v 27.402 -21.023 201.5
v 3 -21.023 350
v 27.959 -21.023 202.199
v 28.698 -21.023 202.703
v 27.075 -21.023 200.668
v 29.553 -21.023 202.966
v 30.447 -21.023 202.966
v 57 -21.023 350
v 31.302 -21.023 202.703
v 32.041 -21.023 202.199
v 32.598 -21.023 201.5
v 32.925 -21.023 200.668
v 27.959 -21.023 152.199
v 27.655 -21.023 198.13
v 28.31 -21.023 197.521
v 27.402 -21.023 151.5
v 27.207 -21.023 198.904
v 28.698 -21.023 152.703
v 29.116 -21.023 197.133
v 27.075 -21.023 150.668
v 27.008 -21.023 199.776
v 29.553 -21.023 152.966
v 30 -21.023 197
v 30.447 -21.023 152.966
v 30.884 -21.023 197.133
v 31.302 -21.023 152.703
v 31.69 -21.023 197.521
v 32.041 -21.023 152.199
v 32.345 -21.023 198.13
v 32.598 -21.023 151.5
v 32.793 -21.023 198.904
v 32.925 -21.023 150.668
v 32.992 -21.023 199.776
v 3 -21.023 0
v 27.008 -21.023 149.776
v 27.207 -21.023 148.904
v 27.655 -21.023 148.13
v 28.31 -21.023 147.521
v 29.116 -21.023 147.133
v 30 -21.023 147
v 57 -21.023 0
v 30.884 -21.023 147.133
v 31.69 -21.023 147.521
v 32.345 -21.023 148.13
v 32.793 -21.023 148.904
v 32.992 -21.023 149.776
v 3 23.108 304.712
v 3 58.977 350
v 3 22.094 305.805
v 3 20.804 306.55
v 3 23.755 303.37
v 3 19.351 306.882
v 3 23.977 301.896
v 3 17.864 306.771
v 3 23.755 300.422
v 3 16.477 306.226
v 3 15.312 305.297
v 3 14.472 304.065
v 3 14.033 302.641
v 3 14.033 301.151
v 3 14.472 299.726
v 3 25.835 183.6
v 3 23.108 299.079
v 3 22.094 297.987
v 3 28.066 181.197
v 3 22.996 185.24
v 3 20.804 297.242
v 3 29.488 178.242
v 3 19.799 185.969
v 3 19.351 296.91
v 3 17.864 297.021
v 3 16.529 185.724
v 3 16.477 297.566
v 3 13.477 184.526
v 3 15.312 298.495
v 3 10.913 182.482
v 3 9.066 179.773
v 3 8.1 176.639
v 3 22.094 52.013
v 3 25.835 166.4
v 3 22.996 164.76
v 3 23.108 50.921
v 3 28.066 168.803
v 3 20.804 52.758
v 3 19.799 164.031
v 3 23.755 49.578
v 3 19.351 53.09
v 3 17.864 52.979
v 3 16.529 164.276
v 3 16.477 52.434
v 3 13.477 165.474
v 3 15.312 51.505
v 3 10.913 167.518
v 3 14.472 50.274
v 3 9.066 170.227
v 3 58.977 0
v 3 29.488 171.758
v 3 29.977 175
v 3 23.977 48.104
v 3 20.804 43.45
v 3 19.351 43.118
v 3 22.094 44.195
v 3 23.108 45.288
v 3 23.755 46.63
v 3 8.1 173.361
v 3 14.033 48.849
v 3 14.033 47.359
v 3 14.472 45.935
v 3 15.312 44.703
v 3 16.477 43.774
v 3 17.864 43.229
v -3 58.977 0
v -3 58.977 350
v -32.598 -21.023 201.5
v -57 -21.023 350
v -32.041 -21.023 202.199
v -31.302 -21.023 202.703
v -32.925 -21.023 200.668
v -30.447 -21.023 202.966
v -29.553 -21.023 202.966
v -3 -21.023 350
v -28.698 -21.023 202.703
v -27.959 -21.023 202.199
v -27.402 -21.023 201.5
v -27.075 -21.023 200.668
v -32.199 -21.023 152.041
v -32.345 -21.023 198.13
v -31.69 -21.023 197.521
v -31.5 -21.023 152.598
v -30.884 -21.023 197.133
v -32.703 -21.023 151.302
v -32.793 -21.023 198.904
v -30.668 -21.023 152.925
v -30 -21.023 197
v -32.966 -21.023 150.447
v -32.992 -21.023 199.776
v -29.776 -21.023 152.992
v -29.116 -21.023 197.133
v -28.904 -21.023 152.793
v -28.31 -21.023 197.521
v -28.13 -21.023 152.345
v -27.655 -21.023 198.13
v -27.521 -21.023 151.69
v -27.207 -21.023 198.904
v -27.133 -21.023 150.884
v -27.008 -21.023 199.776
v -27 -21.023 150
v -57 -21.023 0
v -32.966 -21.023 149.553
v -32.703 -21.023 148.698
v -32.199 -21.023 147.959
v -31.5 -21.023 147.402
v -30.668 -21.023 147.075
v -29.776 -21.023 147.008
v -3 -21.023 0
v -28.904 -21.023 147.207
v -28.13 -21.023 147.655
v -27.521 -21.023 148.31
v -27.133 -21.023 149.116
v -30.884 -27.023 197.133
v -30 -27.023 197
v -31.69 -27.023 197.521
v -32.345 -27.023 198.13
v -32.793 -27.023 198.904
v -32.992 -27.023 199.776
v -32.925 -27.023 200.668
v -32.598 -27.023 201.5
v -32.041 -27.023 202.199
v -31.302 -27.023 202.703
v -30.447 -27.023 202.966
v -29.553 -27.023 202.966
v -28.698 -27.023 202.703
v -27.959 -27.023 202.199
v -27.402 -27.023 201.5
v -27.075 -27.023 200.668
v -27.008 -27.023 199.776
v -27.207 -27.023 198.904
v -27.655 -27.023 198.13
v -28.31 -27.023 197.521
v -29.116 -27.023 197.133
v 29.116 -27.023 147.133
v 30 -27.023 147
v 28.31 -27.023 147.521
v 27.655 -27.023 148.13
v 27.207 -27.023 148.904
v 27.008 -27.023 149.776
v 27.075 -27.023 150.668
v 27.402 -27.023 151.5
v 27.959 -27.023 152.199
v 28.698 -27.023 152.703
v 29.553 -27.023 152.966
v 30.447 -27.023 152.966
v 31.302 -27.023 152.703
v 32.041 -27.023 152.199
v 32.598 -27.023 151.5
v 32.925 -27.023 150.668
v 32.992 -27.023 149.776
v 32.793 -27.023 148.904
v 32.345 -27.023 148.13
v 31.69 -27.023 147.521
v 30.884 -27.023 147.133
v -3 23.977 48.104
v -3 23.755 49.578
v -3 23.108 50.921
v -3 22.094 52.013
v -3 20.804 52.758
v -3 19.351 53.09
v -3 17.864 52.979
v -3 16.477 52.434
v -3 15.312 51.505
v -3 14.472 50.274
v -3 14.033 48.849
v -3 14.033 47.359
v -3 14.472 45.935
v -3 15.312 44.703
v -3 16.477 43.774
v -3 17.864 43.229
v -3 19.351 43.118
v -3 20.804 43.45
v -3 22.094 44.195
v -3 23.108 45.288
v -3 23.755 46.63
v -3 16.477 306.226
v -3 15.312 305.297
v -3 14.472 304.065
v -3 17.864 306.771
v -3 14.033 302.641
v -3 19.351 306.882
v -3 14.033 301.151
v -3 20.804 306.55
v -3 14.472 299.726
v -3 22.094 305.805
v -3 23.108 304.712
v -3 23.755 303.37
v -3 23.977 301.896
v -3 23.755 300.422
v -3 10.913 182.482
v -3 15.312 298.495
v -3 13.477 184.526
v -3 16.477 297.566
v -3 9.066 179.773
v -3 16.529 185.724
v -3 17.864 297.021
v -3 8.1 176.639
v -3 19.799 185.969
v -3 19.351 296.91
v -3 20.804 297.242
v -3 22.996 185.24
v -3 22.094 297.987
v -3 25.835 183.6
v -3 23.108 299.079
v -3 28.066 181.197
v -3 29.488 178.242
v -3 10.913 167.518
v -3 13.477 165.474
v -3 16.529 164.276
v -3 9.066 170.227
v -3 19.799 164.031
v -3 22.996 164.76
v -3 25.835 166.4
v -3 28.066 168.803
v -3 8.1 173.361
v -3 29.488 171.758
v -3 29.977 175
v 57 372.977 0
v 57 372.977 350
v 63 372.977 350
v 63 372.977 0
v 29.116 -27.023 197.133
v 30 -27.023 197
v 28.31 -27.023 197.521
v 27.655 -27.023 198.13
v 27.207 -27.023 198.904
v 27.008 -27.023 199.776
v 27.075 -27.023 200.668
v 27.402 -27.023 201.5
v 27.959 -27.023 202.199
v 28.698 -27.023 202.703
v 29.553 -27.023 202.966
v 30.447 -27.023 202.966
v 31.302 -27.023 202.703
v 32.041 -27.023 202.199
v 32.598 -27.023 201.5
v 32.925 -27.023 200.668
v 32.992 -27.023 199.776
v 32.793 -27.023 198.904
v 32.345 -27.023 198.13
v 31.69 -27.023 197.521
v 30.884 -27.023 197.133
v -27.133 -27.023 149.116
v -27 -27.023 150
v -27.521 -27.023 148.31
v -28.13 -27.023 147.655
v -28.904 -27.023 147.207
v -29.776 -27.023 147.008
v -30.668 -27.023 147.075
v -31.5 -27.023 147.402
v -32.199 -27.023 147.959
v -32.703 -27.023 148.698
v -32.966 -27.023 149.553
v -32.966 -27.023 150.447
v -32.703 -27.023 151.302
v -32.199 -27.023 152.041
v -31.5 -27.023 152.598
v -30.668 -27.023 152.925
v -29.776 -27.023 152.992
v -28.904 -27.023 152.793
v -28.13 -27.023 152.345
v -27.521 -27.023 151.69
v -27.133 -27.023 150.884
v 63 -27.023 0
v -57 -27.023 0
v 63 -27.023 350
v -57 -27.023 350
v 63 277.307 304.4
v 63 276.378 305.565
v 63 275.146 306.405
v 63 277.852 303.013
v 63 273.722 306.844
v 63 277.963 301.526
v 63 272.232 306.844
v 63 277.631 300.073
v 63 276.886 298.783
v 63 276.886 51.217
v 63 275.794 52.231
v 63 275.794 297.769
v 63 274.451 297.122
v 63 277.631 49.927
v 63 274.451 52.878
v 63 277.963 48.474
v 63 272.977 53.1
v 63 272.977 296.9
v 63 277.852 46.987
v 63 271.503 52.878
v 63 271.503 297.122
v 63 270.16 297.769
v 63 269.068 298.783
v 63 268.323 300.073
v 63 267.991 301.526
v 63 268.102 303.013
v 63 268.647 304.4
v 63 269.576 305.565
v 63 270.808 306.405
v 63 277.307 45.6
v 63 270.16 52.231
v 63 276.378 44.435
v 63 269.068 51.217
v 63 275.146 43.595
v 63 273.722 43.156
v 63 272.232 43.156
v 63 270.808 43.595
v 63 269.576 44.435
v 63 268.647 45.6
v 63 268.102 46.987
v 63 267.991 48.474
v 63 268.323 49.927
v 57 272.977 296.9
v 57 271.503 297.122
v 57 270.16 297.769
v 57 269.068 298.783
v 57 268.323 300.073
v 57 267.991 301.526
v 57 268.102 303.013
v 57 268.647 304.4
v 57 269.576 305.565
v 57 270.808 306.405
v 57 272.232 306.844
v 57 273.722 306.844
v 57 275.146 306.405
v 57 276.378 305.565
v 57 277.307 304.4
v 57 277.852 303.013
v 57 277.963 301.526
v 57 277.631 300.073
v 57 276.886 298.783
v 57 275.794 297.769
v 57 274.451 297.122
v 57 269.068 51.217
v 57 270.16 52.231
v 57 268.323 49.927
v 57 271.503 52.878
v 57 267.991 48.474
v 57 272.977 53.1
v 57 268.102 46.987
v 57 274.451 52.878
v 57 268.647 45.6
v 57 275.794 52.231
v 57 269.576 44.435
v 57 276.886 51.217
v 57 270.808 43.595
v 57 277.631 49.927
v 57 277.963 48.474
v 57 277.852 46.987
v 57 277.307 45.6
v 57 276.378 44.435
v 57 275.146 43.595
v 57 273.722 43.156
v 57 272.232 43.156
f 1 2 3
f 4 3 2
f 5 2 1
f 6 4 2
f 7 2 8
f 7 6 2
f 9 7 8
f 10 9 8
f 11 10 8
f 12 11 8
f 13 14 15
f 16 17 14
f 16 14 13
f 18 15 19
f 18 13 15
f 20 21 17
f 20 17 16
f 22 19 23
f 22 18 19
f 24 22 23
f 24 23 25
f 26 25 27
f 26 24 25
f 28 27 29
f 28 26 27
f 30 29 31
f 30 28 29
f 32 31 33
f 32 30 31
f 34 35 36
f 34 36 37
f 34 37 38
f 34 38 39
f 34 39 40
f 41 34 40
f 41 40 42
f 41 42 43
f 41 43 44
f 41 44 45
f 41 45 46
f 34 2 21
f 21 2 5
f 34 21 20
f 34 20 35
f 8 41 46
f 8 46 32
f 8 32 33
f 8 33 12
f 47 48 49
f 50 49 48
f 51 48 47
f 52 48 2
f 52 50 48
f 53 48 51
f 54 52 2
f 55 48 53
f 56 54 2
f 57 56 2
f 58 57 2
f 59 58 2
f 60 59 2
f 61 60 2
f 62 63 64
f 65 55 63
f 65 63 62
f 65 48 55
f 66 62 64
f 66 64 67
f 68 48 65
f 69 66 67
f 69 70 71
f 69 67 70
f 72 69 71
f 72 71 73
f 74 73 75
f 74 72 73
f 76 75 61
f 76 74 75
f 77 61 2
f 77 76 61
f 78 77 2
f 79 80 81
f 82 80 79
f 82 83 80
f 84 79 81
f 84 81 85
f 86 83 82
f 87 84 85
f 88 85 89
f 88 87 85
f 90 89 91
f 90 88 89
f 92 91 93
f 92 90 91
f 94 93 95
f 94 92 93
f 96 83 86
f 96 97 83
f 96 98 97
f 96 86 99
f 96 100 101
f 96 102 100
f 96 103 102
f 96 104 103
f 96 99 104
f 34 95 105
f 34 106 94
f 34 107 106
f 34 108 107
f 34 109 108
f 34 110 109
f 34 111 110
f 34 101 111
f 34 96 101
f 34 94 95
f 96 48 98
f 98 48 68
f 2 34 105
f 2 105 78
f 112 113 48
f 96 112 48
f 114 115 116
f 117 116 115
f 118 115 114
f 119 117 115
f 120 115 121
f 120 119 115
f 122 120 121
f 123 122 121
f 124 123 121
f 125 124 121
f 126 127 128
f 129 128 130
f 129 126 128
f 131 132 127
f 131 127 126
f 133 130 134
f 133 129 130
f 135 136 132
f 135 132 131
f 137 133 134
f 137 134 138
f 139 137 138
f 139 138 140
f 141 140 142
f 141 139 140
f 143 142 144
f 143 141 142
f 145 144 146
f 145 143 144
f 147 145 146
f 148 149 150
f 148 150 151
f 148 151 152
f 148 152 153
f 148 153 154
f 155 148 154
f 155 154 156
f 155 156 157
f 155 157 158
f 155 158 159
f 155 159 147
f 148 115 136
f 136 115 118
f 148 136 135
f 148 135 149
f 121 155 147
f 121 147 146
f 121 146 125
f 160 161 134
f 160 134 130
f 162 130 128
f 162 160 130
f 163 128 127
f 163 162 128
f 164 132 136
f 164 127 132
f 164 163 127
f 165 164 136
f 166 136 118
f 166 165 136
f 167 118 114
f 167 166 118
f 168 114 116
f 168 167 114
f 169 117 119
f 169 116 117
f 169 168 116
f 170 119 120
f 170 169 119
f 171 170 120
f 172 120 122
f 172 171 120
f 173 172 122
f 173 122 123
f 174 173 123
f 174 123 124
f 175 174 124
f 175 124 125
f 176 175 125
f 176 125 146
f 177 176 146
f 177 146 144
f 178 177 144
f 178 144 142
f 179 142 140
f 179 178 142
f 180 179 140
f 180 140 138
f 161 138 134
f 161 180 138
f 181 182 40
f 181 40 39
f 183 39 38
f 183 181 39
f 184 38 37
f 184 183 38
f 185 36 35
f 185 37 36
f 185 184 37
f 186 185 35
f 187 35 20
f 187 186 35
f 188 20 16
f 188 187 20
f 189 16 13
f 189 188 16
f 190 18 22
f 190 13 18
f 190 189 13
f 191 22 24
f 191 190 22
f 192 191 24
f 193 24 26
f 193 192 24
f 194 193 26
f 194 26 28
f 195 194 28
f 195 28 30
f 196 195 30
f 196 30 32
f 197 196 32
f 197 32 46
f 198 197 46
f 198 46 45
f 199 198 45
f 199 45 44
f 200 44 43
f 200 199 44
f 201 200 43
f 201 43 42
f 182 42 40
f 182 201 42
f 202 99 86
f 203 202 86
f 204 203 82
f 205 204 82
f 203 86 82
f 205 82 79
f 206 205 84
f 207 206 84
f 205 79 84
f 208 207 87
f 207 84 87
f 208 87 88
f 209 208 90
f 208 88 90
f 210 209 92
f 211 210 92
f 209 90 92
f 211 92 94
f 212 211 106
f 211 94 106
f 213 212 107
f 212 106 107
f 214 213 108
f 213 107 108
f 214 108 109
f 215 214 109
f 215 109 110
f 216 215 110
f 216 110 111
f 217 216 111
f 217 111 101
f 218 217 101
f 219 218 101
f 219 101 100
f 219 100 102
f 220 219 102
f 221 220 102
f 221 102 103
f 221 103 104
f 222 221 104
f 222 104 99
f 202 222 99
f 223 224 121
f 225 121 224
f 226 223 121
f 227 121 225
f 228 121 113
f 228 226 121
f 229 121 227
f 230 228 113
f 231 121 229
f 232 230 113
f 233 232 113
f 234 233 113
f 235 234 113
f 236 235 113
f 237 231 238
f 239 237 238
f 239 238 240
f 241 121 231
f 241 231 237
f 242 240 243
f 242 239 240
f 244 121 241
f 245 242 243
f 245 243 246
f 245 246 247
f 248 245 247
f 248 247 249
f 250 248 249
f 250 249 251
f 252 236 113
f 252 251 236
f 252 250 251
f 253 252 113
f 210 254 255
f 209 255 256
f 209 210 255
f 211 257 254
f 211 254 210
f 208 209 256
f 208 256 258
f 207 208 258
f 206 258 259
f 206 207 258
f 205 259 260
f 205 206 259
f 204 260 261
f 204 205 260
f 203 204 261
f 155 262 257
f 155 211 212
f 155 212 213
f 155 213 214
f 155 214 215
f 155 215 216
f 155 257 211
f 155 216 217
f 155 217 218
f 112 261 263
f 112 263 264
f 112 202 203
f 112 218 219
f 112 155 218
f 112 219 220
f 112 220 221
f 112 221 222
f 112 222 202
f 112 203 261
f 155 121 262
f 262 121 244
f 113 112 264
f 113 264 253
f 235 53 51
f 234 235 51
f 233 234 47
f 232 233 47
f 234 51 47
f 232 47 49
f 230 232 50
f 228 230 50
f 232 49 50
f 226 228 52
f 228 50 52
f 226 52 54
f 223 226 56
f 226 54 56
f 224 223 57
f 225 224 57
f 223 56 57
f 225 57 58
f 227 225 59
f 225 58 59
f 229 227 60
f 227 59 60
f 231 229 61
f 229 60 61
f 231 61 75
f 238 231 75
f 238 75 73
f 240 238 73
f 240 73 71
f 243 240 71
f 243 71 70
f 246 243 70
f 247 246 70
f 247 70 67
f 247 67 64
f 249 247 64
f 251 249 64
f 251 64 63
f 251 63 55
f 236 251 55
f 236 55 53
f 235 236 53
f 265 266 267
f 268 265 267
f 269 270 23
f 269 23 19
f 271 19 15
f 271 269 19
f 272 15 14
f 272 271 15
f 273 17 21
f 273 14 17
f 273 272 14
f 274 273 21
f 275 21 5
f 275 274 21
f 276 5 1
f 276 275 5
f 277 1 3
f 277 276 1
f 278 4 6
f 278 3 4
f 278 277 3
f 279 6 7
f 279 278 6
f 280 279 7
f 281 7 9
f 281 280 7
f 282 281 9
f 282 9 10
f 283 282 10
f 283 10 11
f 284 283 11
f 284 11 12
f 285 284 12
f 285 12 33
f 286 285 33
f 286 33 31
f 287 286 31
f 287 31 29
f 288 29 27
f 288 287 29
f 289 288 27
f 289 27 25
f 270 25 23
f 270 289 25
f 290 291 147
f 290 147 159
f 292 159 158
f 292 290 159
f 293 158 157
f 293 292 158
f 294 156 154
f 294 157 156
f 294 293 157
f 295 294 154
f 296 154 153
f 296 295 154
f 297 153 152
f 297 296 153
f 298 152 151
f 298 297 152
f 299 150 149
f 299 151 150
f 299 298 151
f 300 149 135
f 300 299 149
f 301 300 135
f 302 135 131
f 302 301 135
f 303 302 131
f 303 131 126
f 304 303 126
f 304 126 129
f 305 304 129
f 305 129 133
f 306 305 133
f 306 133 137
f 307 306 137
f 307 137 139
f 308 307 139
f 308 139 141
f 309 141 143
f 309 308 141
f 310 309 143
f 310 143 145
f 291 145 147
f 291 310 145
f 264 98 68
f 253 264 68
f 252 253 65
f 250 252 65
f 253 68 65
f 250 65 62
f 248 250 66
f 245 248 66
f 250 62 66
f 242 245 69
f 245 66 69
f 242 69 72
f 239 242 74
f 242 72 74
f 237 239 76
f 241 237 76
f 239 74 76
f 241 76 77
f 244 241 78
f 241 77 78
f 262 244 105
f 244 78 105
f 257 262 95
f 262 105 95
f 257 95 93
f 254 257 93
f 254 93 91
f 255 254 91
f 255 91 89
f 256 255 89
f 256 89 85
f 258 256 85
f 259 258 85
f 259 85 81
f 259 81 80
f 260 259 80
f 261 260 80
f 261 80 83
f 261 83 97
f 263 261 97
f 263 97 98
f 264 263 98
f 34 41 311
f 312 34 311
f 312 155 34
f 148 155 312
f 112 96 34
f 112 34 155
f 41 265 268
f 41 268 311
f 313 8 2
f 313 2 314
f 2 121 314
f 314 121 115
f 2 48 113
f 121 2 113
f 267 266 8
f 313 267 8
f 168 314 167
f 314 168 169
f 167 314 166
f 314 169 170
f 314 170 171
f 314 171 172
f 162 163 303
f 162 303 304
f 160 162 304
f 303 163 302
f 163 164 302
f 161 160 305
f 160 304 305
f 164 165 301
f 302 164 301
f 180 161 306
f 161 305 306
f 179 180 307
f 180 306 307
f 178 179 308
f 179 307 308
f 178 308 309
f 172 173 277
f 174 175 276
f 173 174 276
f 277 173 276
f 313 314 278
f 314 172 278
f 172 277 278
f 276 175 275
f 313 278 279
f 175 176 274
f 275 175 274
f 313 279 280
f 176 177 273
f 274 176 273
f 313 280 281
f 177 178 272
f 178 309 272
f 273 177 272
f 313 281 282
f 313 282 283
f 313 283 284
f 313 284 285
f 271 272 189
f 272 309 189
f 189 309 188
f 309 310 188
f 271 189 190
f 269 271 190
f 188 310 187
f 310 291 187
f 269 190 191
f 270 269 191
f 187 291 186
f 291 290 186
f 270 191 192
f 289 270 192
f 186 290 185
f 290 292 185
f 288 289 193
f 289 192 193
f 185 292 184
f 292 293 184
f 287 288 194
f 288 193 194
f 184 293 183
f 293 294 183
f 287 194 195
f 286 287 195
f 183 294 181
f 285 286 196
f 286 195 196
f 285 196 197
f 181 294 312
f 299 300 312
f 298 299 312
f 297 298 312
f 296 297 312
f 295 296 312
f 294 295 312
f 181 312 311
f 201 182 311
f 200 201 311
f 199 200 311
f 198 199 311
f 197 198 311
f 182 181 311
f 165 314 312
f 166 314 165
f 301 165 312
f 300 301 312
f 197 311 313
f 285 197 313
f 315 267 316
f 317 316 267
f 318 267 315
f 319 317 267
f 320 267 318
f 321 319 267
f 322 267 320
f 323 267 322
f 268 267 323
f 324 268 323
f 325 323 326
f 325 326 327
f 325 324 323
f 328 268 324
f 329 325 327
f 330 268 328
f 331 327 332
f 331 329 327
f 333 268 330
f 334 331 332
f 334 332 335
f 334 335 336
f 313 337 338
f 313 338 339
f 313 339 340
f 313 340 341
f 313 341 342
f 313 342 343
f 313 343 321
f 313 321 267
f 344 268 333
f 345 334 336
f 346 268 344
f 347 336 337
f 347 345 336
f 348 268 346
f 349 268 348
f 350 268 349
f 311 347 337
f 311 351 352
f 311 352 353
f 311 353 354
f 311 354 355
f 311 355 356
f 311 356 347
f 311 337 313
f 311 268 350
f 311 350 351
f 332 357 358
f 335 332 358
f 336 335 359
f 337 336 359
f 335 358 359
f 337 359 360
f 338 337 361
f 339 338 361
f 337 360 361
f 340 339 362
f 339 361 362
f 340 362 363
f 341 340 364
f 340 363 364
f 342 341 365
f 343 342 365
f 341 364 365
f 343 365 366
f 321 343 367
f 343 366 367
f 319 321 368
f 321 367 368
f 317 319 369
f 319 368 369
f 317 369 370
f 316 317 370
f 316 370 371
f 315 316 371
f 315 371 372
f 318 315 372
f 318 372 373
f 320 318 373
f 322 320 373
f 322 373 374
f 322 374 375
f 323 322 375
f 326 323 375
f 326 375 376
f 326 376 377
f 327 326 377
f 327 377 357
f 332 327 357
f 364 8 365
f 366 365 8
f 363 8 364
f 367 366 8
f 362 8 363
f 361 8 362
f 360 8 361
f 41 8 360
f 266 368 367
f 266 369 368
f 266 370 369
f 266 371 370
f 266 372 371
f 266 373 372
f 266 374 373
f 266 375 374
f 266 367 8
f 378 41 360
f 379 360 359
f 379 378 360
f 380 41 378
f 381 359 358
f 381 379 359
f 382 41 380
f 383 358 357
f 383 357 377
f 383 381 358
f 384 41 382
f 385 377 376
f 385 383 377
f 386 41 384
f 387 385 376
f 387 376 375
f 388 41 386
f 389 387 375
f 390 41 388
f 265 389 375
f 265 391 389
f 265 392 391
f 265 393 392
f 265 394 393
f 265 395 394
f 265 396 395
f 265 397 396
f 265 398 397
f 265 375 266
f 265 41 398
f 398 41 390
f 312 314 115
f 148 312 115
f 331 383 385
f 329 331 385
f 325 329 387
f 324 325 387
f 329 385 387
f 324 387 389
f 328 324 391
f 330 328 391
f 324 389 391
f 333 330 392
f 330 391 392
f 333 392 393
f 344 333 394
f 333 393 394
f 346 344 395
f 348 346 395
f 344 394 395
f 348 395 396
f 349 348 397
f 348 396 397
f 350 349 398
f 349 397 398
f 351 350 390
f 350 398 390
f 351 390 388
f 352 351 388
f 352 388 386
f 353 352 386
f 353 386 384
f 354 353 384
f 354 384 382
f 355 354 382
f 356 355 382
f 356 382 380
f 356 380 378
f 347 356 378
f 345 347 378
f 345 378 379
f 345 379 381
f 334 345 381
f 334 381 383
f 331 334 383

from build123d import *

# Parameters (mm, degrees)
BOSS_EXTRUDE1_DEPTH     = 350
CUT_EXTRUDE1_DEPTH      = 531.758890646
CUT_EXTRUDE1_DEPTH_BACK = 531.758890646
SKETCH2_R               = 3
SKETCH3_R               = 11
SKETCH3_R_2             = 5
CUT_EXTRUDE2_DEPTH      = 515.987214376
SKETCH4_R               = 5
CUT_EXTRUDE3_DEPTH      = 525.030372184


with BuildPart() as part:
    # Sketch1 → Boss-Extrude1 (new body)
    with BuildSketch(Plane.XY):
        Polygon((3, 58.976984506), (3, -21.023015494), (57, -21.023015494), (57, 372.976984506), (63, 372.976984506), (63, -27.023015494), (57, -27.023015494), (-57, -27.023015494), (-57, -21.023015494), (-3, -21.023015494), (-3, 58.976984506), align=None)
    extrude(amount=BOSS_EXTRUDE1_DEPTH)

    # Sketch2 → Cut-Extrude1 (cut, two sides: drawn at the far end of the back side and taken through both)
    with BuildSketch(Plane(origin=(0, -21.023015494, 0), x_dir=(1, 0, 0), z_dir=(0, 1, 0)).offset(-CUT_EXTRUDE1_DEPTH_BACK)):
        with Locations((-30, -150)):
            Circle(SKETCH2_R)
        with Locations(Location((-30, -200, 0), (0, 0, 90))):
            Circle(SKETCH2_R)
        with Locations(Location((30, -200, 0), (0, 0, 90))):
            Circle(SKETCH2_R)
        with Locations(Location((30, -150, 0), (0, 0, 90))):
            Circle(SKETCH2_R)
    extrude(amount=CUT_EXTRUDE1_DEPTH + CUT_EXTRUDE1_DEPTH_BACK, mode=Mode.SUBTRACT)

    # Sketch3 → Cut-Extrude2 (cut, through all)
    with BuildSketch(Plane(origin=(3, 0, 0), x_dir=(0, 0, -1), z_dir=(1, 0, 0))):
        with Locations(Location((-175, 18.976984506, 0), (0, 0, 90))):
            Circle(SKETCH3_R)
        with Locations(Location((-301.895890035, 18.976984506, 0), (0, 0, 90))):
            Circle(SKETCH3_R_2)
        with Locations(Location((-48.104109965, 18.976984506, 0), (0, 0, 90))):
            Circle(SKETCH3_R_2)
    extrude(amount=-CUT_EXTRUDE2_DEPTH, mode=Mode.SUBTRACT)

    # Sketch4 → Cut-Extrude3 (cut, through all)
    with BuildSketch(Plane.ZY.offset(-57)):
        with Locations((48.1, 272.976984506)):
            Circle(SKETCH4_R)
        with Locations(Location((301.9, 272.976984506, 0), (0, 0, 180))):
            Circle(SKETCH4_R)
    extrude(amount=-CUT_EXTRUDE3_DEPTH, mode=Mode.SUBTRACT)


solid = part.part
